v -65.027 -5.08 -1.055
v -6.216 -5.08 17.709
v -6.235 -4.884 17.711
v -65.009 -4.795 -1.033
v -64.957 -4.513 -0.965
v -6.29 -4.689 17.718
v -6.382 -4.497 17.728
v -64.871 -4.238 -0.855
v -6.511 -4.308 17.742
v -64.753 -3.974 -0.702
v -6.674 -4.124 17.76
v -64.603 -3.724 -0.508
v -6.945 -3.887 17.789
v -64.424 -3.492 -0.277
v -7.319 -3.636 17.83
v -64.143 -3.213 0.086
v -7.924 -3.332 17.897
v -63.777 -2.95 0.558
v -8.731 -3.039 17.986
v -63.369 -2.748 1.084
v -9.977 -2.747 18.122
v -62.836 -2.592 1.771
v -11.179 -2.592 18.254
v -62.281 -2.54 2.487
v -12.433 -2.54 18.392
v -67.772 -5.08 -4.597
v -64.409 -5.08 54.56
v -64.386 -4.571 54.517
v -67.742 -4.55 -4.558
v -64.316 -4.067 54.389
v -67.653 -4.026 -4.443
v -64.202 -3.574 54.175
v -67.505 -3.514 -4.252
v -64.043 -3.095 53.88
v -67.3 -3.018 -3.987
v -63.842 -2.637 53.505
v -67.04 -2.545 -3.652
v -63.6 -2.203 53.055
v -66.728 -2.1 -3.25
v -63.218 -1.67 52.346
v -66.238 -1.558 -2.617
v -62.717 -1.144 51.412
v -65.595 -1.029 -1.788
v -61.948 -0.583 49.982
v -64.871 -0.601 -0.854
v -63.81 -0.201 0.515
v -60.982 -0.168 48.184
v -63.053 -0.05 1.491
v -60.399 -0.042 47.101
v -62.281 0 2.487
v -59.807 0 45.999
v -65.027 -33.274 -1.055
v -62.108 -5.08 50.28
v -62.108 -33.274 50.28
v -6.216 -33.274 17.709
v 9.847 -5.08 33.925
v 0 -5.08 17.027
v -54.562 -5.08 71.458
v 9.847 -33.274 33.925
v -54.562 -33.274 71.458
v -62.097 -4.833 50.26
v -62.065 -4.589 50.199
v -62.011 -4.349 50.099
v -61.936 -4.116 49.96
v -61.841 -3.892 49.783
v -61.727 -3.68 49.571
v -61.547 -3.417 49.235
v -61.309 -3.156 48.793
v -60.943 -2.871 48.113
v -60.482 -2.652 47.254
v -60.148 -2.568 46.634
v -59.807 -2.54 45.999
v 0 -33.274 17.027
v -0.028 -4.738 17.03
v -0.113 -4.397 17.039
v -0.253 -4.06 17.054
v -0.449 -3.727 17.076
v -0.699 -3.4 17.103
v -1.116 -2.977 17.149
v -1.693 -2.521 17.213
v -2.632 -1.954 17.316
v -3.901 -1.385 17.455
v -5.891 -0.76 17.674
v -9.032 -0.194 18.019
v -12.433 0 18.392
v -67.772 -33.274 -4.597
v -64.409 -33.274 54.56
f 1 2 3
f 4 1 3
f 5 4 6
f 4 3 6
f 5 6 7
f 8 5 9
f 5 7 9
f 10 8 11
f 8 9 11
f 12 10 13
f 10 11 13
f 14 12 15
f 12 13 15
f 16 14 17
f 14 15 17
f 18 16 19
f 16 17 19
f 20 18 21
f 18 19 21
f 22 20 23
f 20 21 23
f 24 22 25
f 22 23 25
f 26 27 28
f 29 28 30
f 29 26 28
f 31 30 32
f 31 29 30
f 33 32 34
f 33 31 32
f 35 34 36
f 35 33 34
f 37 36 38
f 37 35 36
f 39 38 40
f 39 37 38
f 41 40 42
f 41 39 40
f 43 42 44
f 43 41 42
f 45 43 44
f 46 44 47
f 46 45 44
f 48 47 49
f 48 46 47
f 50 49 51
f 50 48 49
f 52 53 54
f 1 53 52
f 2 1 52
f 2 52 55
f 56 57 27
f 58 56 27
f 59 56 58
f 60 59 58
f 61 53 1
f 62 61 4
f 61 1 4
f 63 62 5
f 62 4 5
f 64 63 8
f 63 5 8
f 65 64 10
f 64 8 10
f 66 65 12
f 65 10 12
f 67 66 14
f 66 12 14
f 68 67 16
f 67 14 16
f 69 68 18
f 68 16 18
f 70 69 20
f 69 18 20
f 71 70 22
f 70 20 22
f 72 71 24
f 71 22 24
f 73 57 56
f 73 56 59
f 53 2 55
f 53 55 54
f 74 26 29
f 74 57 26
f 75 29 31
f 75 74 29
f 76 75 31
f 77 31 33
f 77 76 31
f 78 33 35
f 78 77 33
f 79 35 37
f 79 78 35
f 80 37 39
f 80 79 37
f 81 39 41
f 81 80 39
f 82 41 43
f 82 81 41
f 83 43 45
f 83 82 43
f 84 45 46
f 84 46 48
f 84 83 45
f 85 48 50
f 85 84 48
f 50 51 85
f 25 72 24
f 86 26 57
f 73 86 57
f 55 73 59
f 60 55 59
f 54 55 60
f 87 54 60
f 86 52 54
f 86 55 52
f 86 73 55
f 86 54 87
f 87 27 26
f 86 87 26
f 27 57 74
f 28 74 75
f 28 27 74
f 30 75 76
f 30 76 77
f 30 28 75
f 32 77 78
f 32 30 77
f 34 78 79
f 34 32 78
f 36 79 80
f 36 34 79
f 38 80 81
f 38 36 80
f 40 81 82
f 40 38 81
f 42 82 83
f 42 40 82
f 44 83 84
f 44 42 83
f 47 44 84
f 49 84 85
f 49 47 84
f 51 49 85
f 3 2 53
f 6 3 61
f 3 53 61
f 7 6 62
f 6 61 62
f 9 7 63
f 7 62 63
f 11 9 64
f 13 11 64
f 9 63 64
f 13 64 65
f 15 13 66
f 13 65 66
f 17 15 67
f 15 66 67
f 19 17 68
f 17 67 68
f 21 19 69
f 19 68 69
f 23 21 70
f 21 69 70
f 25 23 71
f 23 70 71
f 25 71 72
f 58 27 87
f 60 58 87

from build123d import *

# Parameters (mm, degrees)
F0_R     = 10.6194281647
F1_DEPTH = 33.274
F3_R     = 5.08
F4_T     = -2.54
F5_DEPTH = 19.558


# Not quite as in the source:
# - the program builds the solid bodies; features that only make, move or delete a surface that nothing else refers to are left out


with BuildPart() as f1:
    # F0 (on Front) → F1 (new body)
    with BuildSketch(Plane.XZ):
        Polygon((0, 17.026649788), (-64.4087642431, 54.5603483915), (-67.7721425891, -4.5970836654), align=None)
        with Locations((-48.2645332813, 22.2235824913)):
            Circle(F0_R, mode=Mode.SUBTRACT)
        with Locations((-48.2645332813, 22.2235824913)):
            Circle(F0_R)
    extrude(amount=F1_DEPTH)

    # F3
    f3_edges = [f1.edges().sort_by_distance(p)[0] for p in [
        (-33.886071, 0, 6.214783),
        (-32.204382, 0, 35.793499),
        (-66.090453, 0, 24.981632),
    ]]
    fillet(f3_edges, radius=F3_R)

    # F4
    f4_openings = [f1.faces().sort_by_distance(p)[0] for p in [
        (-44.060302, -33.274, 22.329972),
    ]]
    offset(amount=F4_T, openings=f4_openings)

    # F5 (add): a face of the model
    f5_faces = [f1.faces().sort_by_distance(p)[0] for p in [
        (-32.2043821216, -19.177, 35.7934990898),
    ]]
    extrude(f5_faces, amount=F5_DEPTH)


solid = f1.part
